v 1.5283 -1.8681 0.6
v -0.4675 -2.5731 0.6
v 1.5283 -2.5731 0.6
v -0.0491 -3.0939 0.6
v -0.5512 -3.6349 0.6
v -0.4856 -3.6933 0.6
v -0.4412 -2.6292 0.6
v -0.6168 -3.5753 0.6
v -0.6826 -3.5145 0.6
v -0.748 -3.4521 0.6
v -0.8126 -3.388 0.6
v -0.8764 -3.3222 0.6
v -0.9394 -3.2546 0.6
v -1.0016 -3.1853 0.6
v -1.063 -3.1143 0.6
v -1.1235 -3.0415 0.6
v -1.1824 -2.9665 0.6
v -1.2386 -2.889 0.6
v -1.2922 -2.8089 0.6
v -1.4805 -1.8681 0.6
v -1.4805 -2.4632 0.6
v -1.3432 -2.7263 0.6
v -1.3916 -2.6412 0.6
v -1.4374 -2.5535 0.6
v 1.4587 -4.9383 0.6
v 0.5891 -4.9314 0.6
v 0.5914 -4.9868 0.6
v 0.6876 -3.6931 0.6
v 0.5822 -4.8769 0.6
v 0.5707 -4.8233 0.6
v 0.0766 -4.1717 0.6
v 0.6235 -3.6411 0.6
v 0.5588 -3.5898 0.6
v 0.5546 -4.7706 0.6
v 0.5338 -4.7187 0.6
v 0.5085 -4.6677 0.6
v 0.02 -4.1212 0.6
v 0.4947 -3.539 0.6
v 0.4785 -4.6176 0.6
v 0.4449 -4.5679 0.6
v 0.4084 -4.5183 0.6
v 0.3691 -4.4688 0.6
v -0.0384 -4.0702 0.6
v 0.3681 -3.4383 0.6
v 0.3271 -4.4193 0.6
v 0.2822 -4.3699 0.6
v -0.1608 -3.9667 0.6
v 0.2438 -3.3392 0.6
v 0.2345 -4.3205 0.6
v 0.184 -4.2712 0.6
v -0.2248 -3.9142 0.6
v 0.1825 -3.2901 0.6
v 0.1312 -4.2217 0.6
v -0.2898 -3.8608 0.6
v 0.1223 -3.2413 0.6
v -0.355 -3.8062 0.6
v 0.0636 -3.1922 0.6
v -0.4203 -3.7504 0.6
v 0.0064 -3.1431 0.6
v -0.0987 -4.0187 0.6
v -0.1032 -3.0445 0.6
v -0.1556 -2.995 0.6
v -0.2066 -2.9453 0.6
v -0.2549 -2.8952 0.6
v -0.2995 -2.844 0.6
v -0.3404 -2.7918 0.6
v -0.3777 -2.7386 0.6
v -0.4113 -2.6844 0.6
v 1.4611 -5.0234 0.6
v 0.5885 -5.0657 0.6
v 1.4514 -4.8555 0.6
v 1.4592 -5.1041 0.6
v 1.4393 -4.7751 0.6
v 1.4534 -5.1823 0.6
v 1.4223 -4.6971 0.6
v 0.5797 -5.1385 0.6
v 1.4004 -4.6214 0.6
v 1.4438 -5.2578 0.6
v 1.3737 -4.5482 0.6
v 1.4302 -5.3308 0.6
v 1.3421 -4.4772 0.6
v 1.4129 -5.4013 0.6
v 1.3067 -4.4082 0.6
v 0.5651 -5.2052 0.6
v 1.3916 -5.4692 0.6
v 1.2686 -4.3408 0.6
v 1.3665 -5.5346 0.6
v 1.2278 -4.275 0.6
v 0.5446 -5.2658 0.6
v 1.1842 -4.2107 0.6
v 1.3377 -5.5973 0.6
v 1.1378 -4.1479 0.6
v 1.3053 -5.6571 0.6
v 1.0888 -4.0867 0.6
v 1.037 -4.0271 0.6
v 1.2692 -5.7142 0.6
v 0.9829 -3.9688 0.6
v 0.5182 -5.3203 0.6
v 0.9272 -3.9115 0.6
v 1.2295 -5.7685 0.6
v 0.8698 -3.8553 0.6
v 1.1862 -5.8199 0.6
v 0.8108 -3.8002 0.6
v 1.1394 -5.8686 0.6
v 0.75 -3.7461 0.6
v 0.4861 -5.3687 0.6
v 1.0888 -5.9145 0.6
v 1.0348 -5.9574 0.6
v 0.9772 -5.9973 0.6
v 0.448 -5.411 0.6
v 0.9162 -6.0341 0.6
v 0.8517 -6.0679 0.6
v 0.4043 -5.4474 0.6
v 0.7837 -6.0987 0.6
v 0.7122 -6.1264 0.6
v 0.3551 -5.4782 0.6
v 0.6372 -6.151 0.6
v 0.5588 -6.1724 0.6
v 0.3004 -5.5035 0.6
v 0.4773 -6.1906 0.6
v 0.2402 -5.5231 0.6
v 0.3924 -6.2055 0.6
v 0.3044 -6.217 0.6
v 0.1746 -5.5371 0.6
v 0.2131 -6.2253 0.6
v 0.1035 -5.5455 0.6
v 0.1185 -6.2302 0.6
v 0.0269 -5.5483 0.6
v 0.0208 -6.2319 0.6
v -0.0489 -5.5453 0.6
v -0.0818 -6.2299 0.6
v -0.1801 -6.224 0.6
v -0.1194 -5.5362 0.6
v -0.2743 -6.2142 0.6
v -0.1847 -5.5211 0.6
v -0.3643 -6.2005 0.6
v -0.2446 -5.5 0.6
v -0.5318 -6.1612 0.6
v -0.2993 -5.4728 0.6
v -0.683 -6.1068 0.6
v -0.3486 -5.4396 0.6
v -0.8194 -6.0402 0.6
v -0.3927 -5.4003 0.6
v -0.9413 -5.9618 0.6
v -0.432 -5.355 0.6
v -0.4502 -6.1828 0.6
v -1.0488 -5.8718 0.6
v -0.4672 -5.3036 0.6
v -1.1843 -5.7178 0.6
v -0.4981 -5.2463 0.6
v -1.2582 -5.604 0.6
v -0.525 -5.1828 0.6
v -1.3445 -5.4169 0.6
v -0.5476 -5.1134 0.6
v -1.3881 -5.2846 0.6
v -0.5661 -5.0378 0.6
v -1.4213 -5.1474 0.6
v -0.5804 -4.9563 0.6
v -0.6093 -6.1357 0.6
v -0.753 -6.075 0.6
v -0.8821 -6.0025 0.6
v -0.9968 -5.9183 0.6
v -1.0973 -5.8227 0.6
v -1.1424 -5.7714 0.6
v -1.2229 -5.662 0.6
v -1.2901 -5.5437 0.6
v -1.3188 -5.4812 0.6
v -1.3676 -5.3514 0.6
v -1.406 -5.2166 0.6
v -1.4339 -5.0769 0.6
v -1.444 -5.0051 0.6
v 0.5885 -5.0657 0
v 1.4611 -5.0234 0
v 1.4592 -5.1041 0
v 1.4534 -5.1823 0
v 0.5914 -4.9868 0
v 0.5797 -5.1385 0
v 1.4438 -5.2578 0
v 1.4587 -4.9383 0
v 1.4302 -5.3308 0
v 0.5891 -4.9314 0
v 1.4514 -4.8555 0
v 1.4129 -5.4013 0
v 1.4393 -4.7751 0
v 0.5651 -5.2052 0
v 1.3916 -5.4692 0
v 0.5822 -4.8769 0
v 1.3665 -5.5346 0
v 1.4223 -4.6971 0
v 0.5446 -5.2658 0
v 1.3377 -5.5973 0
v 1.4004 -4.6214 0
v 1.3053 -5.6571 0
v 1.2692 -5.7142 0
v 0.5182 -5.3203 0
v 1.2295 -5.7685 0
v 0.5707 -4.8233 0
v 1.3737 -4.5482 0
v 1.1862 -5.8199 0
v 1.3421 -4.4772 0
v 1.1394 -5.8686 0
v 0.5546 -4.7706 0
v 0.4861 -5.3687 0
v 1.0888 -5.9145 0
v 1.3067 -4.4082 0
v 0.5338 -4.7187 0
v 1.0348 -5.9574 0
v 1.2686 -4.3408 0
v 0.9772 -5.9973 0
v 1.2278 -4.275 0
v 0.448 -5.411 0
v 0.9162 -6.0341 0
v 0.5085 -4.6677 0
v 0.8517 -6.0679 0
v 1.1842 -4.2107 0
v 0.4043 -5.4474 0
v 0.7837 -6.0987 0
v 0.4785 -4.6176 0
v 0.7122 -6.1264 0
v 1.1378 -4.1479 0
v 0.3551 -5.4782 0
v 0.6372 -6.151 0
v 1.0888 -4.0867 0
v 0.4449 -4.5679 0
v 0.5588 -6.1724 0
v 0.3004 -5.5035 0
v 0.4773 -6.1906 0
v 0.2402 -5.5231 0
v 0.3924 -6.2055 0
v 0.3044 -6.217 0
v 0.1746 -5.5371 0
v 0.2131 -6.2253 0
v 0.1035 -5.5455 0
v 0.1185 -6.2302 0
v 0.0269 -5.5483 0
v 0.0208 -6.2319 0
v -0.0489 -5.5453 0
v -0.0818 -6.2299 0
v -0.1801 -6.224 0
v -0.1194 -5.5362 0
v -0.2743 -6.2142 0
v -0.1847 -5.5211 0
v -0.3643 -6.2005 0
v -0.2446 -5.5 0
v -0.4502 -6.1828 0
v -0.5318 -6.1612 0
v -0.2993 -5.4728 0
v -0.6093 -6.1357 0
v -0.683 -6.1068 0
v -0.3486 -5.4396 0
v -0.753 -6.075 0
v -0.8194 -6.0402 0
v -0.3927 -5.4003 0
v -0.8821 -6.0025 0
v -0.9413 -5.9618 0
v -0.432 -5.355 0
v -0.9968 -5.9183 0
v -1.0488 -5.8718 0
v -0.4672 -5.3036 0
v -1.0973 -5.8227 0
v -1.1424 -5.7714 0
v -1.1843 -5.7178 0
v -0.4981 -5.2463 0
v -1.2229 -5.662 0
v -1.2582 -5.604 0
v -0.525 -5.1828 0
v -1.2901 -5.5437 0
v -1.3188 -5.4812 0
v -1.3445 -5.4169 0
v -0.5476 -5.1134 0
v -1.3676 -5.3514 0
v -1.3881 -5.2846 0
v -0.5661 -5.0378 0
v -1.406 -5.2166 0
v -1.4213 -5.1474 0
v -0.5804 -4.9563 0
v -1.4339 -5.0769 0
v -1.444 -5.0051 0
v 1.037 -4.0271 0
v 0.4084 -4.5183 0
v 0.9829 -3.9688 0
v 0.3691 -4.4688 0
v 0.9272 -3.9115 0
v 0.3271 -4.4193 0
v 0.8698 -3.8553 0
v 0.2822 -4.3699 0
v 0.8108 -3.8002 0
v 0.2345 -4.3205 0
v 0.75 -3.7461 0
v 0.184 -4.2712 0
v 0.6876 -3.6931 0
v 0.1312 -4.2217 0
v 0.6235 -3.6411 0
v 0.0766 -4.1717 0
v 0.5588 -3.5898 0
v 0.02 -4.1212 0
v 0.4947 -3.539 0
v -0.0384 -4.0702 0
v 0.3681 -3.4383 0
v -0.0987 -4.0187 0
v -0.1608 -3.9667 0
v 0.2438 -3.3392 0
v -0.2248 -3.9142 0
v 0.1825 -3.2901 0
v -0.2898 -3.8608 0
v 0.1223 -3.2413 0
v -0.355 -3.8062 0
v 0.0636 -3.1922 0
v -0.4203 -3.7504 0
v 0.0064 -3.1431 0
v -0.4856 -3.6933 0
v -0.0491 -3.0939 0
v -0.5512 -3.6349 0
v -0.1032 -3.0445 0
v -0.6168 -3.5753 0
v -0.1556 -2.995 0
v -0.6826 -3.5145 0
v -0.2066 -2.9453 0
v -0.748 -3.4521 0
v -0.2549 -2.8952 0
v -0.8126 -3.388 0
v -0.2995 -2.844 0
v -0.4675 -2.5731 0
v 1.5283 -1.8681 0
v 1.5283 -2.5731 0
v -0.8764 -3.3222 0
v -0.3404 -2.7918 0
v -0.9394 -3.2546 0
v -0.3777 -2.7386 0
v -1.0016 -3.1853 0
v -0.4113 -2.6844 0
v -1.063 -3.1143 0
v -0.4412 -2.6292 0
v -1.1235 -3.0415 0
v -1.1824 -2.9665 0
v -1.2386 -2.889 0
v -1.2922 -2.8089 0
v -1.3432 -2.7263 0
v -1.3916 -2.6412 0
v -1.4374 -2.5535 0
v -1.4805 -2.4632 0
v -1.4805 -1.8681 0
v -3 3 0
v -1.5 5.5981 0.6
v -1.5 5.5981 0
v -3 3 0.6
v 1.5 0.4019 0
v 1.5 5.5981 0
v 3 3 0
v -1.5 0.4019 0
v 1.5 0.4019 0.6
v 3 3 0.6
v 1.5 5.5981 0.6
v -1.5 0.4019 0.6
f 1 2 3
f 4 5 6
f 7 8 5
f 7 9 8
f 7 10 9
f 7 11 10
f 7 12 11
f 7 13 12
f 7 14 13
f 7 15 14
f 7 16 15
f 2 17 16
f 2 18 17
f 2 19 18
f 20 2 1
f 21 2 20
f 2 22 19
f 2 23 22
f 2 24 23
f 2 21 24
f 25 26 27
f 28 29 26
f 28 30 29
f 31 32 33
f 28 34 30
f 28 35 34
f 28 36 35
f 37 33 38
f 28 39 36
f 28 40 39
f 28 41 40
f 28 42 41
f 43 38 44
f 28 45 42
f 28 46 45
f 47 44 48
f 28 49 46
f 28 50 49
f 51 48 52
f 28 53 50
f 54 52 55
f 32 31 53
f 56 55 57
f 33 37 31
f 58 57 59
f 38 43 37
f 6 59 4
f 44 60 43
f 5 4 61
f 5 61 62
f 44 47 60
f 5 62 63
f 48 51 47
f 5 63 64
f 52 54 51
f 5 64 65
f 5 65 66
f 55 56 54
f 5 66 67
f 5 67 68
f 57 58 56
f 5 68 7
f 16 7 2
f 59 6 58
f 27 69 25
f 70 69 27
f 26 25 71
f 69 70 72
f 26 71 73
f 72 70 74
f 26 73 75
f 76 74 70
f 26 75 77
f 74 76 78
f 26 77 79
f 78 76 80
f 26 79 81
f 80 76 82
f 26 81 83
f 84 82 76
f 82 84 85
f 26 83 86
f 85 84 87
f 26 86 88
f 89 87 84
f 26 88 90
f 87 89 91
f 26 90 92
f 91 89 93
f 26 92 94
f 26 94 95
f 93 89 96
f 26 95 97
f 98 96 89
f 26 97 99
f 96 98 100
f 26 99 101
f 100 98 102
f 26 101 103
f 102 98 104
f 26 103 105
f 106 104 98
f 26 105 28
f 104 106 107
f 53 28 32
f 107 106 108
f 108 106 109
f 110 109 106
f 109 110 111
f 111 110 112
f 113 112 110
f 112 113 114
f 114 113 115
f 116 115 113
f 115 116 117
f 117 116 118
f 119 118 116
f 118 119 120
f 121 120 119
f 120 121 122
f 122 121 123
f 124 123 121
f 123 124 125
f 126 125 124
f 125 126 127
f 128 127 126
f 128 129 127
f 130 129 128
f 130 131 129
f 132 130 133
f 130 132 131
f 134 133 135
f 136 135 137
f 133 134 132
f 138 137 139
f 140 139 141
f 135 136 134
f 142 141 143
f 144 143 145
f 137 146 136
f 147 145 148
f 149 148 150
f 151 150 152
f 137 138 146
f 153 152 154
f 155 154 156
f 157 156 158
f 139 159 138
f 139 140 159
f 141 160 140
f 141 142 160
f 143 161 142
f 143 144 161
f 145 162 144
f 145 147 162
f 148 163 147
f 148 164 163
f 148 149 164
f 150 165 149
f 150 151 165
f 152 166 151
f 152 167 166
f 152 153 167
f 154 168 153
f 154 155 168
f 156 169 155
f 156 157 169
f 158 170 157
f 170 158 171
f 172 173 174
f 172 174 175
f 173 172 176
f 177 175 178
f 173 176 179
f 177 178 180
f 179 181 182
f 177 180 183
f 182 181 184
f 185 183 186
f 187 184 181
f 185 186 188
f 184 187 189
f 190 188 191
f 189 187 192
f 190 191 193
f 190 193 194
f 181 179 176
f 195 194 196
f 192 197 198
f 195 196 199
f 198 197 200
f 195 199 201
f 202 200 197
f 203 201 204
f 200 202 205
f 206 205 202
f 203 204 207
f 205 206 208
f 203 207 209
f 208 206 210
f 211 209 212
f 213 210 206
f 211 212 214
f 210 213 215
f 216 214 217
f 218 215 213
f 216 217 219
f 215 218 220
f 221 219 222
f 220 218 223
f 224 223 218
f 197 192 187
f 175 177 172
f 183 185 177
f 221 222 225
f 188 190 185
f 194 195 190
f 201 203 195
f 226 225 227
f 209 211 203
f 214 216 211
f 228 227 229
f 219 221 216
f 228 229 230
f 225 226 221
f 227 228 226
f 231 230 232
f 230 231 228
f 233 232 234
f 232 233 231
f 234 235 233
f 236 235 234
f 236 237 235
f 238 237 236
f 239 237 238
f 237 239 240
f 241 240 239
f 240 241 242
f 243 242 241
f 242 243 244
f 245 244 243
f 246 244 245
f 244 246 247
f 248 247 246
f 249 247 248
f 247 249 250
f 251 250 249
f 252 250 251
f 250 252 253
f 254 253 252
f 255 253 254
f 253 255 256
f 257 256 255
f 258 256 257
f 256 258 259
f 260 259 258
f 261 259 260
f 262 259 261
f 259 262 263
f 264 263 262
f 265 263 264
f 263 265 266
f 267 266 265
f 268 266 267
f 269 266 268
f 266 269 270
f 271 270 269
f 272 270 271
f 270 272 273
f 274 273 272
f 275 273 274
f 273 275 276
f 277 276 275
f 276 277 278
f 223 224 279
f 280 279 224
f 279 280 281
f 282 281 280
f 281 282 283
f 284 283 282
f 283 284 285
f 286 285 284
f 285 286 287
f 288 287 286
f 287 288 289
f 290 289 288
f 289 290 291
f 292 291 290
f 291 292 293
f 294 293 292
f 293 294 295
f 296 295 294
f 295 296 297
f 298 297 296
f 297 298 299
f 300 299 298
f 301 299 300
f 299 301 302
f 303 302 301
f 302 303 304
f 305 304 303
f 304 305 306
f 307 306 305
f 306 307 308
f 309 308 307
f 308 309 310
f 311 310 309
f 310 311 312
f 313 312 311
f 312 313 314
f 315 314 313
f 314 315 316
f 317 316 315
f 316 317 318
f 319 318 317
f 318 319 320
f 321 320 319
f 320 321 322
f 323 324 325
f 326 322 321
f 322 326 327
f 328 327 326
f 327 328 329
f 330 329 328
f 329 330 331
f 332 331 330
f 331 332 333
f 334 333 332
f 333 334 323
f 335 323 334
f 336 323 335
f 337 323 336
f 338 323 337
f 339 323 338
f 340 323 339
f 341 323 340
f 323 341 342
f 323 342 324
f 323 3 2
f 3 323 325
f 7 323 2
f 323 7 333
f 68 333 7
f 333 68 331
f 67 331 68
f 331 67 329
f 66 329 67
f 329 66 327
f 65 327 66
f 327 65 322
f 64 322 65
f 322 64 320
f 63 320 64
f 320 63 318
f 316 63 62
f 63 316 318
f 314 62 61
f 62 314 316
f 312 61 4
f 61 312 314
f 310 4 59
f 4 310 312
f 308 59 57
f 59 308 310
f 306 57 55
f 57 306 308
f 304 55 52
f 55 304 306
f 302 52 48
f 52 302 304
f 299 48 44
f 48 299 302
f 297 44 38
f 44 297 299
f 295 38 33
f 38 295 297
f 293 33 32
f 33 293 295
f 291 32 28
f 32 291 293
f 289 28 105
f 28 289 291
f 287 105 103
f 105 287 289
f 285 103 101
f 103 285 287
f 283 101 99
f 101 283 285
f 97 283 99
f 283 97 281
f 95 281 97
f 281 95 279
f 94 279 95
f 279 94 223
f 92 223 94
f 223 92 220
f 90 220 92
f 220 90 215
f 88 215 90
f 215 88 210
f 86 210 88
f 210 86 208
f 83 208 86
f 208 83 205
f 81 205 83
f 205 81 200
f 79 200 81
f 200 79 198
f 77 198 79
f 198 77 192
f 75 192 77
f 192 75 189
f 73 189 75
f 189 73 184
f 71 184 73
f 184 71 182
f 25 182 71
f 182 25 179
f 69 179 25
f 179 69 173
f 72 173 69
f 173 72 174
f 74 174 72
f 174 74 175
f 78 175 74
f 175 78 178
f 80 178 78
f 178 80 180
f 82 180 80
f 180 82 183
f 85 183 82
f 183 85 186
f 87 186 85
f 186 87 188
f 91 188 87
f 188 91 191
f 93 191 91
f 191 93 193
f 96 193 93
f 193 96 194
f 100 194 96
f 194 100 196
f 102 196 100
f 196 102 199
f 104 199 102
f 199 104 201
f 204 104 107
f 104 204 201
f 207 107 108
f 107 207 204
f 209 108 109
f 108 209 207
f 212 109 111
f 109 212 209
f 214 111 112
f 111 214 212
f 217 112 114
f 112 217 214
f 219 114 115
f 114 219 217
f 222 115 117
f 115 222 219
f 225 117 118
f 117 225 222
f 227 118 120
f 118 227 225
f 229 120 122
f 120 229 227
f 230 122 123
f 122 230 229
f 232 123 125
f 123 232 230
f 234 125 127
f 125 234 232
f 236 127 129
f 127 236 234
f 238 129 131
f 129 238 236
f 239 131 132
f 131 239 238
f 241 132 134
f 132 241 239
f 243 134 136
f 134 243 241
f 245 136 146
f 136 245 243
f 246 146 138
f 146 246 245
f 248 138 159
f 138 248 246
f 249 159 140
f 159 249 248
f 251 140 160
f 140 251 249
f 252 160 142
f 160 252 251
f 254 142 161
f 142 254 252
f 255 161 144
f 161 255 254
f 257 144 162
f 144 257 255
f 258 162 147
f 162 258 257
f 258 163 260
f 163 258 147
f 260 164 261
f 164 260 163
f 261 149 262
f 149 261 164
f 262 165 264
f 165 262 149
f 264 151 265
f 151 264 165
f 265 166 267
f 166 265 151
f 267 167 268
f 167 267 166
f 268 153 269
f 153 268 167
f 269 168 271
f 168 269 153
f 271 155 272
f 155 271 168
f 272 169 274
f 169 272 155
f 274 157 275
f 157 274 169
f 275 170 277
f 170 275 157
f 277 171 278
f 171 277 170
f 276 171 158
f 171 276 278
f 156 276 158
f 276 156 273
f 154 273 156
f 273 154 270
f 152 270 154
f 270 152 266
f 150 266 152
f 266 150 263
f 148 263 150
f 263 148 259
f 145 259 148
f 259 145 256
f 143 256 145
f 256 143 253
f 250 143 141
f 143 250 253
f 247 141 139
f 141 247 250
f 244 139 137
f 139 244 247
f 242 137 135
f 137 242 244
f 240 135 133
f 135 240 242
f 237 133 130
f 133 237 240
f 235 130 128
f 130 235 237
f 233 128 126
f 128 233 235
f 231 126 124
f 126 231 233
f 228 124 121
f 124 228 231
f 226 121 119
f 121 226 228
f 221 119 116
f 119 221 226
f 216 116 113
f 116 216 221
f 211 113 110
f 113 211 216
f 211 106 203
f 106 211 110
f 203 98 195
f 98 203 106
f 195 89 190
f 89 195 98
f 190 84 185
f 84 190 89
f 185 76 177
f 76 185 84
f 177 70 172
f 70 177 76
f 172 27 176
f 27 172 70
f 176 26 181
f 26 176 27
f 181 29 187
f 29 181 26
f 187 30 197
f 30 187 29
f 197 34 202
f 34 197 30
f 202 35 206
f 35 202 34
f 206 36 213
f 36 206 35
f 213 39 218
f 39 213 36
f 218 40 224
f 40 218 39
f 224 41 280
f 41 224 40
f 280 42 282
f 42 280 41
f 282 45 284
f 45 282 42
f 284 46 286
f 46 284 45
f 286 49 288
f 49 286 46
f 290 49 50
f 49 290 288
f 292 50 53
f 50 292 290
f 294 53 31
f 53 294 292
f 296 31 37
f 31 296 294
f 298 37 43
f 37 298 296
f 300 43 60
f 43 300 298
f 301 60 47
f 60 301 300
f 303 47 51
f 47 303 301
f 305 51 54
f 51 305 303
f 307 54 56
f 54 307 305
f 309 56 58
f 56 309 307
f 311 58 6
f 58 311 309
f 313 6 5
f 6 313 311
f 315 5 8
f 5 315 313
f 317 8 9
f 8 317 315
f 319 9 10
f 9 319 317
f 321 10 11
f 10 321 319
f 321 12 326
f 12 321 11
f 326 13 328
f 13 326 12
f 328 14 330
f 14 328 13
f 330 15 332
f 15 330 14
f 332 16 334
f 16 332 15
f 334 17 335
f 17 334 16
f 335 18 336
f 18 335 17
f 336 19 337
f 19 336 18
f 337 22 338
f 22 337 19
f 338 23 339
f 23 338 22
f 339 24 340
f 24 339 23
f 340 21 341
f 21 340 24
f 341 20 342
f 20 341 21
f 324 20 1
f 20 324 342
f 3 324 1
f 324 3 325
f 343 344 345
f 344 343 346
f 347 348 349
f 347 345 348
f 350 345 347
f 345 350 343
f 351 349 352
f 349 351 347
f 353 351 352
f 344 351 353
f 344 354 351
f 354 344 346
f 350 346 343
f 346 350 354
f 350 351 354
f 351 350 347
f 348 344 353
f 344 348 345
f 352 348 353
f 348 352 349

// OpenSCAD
$fn = 50;

difference() {
	union() {
		translate(v = [0.0, -4.0, 0.6]) {
			rotate(a = [180, 0, 0]) {
				linear_extrude(height = 0.6) {
					text(font = "Liberation Sans:style=Bold", halign = "center", size = 4.5, text = "2", valign = "center");
				}
			}
		}
		translate(v = [0, 3, 0]) {
			linear_extrude(height = 0.6) {
				polygon(points = [[3.0, 0.0], [1.5000000000000004, 2.598076211353316], [-1.4999999999999993, 2.598076211353316], [-3.0, 3.6739403974420594e-16], [-1.5000000000000013, -2.5980762113533156], [1.499999999999998, -2.598076211353317]]);
			}
		}
	}
	union();
}
